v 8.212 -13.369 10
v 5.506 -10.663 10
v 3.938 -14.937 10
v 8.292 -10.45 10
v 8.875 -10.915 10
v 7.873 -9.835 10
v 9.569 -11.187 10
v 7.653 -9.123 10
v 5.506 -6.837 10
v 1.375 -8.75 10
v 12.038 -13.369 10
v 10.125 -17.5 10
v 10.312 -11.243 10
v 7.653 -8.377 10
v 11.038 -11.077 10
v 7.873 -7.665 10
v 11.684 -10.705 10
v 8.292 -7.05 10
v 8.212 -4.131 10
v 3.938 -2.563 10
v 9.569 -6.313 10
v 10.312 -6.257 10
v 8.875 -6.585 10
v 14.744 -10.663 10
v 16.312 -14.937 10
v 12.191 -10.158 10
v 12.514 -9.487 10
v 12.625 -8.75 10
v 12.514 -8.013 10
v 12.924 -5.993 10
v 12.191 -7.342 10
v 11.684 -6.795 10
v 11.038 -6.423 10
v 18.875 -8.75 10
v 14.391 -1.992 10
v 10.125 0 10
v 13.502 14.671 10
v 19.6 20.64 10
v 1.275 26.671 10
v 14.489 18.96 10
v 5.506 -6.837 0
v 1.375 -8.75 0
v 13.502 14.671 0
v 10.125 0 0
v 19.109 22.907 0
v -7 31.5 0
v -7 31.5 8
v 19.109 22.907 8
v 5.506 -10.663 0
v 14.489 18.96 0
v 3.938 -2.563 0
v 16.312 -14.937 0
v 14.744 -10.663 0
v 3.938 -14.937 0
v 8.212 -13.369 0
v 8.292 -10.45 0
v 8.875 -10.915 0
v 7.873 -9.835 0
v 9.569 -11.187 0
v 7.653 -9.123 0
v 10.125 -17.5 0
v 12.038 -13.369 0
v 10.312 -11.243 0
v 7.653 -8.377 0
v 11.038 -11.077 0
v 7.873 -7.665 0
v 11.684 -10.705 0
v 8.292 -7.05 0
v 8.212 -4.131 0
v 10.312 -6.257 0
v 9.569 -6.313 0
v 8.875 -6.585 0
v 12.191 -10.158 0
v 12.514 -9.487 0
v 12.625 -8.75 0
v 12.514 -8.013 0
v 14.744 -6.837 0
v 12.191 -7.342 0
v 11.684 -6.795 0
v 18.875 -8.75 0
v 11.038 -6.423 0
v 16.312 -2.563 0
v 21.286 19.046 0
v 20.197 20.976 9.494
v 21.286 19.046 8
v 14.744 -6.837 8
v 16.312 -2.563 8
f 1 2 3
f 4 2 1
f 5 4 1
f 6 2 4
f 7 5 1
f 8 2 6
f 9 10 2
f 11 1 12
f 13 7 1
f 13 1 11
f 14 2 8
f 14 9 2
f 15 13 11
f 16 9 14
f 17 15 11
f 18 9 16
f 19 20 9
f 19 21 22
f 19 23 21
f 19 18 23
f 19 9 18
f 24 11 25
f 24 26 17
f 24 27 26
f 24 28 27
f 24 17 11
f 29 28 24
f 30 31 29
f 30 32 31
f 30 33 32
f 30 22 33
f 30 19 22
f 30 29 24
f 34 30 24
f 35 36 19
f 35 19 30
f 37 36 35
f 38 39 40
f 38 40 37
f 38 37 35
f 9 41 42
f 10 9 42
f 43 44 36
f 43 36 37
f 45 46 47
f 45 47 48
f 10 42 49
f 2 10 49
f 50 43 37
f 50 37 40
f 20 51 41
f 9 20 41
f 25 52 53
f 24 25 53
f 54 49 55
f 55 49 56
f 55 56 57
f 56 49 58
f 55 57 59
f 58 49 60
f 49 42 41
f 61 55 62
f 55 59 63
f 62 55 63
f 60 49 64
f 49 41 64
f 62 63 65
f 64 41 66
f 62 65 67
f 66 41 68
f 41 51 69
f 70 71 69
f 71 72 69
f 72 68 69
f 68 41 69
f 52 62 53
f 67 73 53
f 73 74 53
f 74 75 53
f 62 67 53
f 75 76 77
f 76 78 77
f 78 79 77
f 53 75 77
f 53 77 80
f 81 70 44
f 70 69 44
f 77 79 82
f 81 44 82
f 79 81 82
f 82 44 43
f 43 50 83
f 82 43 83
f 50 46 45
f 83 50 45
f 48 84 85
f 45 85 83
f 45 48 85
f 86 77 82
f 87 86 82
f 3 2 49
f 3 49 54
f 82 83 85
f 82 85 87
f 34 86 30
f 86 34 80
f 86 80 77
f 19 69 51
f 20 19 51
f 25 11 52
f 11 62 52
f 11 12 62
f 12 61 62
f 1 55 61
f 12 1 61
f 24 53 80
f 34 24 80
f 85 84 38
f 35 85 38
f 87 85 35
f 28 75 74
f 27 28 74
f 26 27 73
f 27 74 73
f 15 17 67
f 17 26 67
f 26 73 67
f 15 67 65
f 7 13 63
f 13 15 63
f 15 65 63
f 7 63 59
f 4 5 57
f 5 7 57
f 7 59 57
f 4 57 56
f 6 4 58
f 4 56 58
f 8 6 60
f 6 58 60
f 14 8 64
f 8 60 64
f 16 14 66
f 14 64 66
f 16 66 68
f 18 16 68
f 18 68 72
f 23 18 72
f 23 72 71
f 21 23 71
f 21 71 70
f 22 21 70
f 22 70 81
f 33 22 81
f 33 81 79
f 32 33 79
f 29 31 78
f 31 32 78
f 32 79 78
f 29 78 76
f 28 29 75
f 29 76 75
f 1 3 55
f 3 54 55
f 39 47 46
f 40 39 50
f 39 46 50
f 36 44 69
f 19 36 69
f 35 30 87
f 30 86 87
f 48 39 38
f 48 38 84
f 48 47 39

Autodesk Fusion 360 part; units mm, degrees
sketch "Sketch1" plane through (0, 0, 0) normal (0, 0, 1) x (1, 0, 0)
  line L0 (29.7102, -20.9929) -> (0, -20.9929)
  line L1 (-7, 31.5) -> (20.239, 31.5)
  line L2 (20.239, 31.5) -> (29.7102, -20.9929)
  line L3 (-7, 31.5) -> (0, -20.9929)
  line L4 (3.9378, -2.5628) -> (1.375, -8.75)
  line L5 (1.375, -8.75) -> (3.9378, -14.9372)
  line L6 (3.9378, -14.9372) -> (10.125, -17.5)
  line L7 (10.125, -17.5) -> (16.3122, -14.9372)
  line L8 (16.3122, -14.9372) -> (18.875, -8.75)
  line L9 (18.875, -8.75) -> (16.3122, -2.5628)
  line L10 (16.3122, -2.5628) -> (10.125, 0)
  line L11 (15.1989, 4.3652) -> (15.1875, 4.3554)
  line L12 (-7, 31.5) -> (14.4889, 18.96)
  line L13 (-7, 31.5) -> (21.9586, 21.9692)
  line L14 (21.9586, 21.9692) -> (16.3122, -2.5628)
  line L15 (10.125, 0) -> (13.5018, 14.6711)
  line L16 (10.125, 0) -> (3.9378, -2.5628)
  circle A0 centre (10.125, -8.75) radius 2.5
  circle A1 centre (10.125, -8.75) radius 5
  line L17 (7.0314, -1.2814) -> (10.125, -8.75) construction
  line L18 (10.125, 0) -> (8.2116, -4.1306)
  line L19 (8.2116, -4.1306) -> (3.9378, -2.5628)
  line L20 (3.9378, -2.5628) -> (5.5056, -6.8366)
  line L21 (5.5056, -6.8366) -> (1.375, -8.75)
  line L22 (1.375, -8.75) -> (5.5056, -10.6634)
  line L23 (5.5056, -10.6634) -> (3.9378, -14.9372)
  line L24 (3.9378, -14.9372) -> (8.2116, -13.3694)
  line L25 (8.2116, -13.3694) -> (10.125, -17.5)
  line L26 (10.125, -17.5) -> (12.0384, -13.3694)
  line L27 (12.0384, -13.3694) -> (16.3122, -14.9372)
  line L28 (16.3122, -14.9372) -> (14.7444, -10.6634)
  line L29 (14.7444, -10.6634) -> (18.875, -8.75)
  line L30 (18.875, -8.75) -> (14.7444, -6.8366)
  line L31 (14.7444, -6.8366) -> (16.3122, -2.5628)
  line L32 (16.3122, -2.5628) -> (12.0384, -4.1306)
  line L33 (12.0384, -4.1306) -> (10.125, 0)
  line L34 (13.5018, 14.6711) -> (14.4889, 18.96)
  point P0 (10.125, -8.75)
  dimension "d3" = 5
  dimension "d4" = 10
  dimension "d6" = 360
extrude "Extrude1" add sketch "Sketch1" along normal blind 10 contours L10 L12 L13 L14 L15 L34 | L10 L32 L33 | A1 L31 L32 | A1 L29 L30 | A1 L18 L33 | A1 | A1 L27 L28 | A1 L19 L20 | A1 L25 L26 | A1 L21 L22 | A1 L23 L24
chamfer "Chamfer1" distance 3 angle 45 1 edges at (21.9586, 21.9692, 5)
chamfer "Chamfer2" distance 2 angle 45 1 edges at (6.0545, 27.2035, 10)
chamfer "Chamfer3" distance 2 angle 45 2 edges at (15.5283, -4.6997, 10) (18.7989, 8.2414, 10)
